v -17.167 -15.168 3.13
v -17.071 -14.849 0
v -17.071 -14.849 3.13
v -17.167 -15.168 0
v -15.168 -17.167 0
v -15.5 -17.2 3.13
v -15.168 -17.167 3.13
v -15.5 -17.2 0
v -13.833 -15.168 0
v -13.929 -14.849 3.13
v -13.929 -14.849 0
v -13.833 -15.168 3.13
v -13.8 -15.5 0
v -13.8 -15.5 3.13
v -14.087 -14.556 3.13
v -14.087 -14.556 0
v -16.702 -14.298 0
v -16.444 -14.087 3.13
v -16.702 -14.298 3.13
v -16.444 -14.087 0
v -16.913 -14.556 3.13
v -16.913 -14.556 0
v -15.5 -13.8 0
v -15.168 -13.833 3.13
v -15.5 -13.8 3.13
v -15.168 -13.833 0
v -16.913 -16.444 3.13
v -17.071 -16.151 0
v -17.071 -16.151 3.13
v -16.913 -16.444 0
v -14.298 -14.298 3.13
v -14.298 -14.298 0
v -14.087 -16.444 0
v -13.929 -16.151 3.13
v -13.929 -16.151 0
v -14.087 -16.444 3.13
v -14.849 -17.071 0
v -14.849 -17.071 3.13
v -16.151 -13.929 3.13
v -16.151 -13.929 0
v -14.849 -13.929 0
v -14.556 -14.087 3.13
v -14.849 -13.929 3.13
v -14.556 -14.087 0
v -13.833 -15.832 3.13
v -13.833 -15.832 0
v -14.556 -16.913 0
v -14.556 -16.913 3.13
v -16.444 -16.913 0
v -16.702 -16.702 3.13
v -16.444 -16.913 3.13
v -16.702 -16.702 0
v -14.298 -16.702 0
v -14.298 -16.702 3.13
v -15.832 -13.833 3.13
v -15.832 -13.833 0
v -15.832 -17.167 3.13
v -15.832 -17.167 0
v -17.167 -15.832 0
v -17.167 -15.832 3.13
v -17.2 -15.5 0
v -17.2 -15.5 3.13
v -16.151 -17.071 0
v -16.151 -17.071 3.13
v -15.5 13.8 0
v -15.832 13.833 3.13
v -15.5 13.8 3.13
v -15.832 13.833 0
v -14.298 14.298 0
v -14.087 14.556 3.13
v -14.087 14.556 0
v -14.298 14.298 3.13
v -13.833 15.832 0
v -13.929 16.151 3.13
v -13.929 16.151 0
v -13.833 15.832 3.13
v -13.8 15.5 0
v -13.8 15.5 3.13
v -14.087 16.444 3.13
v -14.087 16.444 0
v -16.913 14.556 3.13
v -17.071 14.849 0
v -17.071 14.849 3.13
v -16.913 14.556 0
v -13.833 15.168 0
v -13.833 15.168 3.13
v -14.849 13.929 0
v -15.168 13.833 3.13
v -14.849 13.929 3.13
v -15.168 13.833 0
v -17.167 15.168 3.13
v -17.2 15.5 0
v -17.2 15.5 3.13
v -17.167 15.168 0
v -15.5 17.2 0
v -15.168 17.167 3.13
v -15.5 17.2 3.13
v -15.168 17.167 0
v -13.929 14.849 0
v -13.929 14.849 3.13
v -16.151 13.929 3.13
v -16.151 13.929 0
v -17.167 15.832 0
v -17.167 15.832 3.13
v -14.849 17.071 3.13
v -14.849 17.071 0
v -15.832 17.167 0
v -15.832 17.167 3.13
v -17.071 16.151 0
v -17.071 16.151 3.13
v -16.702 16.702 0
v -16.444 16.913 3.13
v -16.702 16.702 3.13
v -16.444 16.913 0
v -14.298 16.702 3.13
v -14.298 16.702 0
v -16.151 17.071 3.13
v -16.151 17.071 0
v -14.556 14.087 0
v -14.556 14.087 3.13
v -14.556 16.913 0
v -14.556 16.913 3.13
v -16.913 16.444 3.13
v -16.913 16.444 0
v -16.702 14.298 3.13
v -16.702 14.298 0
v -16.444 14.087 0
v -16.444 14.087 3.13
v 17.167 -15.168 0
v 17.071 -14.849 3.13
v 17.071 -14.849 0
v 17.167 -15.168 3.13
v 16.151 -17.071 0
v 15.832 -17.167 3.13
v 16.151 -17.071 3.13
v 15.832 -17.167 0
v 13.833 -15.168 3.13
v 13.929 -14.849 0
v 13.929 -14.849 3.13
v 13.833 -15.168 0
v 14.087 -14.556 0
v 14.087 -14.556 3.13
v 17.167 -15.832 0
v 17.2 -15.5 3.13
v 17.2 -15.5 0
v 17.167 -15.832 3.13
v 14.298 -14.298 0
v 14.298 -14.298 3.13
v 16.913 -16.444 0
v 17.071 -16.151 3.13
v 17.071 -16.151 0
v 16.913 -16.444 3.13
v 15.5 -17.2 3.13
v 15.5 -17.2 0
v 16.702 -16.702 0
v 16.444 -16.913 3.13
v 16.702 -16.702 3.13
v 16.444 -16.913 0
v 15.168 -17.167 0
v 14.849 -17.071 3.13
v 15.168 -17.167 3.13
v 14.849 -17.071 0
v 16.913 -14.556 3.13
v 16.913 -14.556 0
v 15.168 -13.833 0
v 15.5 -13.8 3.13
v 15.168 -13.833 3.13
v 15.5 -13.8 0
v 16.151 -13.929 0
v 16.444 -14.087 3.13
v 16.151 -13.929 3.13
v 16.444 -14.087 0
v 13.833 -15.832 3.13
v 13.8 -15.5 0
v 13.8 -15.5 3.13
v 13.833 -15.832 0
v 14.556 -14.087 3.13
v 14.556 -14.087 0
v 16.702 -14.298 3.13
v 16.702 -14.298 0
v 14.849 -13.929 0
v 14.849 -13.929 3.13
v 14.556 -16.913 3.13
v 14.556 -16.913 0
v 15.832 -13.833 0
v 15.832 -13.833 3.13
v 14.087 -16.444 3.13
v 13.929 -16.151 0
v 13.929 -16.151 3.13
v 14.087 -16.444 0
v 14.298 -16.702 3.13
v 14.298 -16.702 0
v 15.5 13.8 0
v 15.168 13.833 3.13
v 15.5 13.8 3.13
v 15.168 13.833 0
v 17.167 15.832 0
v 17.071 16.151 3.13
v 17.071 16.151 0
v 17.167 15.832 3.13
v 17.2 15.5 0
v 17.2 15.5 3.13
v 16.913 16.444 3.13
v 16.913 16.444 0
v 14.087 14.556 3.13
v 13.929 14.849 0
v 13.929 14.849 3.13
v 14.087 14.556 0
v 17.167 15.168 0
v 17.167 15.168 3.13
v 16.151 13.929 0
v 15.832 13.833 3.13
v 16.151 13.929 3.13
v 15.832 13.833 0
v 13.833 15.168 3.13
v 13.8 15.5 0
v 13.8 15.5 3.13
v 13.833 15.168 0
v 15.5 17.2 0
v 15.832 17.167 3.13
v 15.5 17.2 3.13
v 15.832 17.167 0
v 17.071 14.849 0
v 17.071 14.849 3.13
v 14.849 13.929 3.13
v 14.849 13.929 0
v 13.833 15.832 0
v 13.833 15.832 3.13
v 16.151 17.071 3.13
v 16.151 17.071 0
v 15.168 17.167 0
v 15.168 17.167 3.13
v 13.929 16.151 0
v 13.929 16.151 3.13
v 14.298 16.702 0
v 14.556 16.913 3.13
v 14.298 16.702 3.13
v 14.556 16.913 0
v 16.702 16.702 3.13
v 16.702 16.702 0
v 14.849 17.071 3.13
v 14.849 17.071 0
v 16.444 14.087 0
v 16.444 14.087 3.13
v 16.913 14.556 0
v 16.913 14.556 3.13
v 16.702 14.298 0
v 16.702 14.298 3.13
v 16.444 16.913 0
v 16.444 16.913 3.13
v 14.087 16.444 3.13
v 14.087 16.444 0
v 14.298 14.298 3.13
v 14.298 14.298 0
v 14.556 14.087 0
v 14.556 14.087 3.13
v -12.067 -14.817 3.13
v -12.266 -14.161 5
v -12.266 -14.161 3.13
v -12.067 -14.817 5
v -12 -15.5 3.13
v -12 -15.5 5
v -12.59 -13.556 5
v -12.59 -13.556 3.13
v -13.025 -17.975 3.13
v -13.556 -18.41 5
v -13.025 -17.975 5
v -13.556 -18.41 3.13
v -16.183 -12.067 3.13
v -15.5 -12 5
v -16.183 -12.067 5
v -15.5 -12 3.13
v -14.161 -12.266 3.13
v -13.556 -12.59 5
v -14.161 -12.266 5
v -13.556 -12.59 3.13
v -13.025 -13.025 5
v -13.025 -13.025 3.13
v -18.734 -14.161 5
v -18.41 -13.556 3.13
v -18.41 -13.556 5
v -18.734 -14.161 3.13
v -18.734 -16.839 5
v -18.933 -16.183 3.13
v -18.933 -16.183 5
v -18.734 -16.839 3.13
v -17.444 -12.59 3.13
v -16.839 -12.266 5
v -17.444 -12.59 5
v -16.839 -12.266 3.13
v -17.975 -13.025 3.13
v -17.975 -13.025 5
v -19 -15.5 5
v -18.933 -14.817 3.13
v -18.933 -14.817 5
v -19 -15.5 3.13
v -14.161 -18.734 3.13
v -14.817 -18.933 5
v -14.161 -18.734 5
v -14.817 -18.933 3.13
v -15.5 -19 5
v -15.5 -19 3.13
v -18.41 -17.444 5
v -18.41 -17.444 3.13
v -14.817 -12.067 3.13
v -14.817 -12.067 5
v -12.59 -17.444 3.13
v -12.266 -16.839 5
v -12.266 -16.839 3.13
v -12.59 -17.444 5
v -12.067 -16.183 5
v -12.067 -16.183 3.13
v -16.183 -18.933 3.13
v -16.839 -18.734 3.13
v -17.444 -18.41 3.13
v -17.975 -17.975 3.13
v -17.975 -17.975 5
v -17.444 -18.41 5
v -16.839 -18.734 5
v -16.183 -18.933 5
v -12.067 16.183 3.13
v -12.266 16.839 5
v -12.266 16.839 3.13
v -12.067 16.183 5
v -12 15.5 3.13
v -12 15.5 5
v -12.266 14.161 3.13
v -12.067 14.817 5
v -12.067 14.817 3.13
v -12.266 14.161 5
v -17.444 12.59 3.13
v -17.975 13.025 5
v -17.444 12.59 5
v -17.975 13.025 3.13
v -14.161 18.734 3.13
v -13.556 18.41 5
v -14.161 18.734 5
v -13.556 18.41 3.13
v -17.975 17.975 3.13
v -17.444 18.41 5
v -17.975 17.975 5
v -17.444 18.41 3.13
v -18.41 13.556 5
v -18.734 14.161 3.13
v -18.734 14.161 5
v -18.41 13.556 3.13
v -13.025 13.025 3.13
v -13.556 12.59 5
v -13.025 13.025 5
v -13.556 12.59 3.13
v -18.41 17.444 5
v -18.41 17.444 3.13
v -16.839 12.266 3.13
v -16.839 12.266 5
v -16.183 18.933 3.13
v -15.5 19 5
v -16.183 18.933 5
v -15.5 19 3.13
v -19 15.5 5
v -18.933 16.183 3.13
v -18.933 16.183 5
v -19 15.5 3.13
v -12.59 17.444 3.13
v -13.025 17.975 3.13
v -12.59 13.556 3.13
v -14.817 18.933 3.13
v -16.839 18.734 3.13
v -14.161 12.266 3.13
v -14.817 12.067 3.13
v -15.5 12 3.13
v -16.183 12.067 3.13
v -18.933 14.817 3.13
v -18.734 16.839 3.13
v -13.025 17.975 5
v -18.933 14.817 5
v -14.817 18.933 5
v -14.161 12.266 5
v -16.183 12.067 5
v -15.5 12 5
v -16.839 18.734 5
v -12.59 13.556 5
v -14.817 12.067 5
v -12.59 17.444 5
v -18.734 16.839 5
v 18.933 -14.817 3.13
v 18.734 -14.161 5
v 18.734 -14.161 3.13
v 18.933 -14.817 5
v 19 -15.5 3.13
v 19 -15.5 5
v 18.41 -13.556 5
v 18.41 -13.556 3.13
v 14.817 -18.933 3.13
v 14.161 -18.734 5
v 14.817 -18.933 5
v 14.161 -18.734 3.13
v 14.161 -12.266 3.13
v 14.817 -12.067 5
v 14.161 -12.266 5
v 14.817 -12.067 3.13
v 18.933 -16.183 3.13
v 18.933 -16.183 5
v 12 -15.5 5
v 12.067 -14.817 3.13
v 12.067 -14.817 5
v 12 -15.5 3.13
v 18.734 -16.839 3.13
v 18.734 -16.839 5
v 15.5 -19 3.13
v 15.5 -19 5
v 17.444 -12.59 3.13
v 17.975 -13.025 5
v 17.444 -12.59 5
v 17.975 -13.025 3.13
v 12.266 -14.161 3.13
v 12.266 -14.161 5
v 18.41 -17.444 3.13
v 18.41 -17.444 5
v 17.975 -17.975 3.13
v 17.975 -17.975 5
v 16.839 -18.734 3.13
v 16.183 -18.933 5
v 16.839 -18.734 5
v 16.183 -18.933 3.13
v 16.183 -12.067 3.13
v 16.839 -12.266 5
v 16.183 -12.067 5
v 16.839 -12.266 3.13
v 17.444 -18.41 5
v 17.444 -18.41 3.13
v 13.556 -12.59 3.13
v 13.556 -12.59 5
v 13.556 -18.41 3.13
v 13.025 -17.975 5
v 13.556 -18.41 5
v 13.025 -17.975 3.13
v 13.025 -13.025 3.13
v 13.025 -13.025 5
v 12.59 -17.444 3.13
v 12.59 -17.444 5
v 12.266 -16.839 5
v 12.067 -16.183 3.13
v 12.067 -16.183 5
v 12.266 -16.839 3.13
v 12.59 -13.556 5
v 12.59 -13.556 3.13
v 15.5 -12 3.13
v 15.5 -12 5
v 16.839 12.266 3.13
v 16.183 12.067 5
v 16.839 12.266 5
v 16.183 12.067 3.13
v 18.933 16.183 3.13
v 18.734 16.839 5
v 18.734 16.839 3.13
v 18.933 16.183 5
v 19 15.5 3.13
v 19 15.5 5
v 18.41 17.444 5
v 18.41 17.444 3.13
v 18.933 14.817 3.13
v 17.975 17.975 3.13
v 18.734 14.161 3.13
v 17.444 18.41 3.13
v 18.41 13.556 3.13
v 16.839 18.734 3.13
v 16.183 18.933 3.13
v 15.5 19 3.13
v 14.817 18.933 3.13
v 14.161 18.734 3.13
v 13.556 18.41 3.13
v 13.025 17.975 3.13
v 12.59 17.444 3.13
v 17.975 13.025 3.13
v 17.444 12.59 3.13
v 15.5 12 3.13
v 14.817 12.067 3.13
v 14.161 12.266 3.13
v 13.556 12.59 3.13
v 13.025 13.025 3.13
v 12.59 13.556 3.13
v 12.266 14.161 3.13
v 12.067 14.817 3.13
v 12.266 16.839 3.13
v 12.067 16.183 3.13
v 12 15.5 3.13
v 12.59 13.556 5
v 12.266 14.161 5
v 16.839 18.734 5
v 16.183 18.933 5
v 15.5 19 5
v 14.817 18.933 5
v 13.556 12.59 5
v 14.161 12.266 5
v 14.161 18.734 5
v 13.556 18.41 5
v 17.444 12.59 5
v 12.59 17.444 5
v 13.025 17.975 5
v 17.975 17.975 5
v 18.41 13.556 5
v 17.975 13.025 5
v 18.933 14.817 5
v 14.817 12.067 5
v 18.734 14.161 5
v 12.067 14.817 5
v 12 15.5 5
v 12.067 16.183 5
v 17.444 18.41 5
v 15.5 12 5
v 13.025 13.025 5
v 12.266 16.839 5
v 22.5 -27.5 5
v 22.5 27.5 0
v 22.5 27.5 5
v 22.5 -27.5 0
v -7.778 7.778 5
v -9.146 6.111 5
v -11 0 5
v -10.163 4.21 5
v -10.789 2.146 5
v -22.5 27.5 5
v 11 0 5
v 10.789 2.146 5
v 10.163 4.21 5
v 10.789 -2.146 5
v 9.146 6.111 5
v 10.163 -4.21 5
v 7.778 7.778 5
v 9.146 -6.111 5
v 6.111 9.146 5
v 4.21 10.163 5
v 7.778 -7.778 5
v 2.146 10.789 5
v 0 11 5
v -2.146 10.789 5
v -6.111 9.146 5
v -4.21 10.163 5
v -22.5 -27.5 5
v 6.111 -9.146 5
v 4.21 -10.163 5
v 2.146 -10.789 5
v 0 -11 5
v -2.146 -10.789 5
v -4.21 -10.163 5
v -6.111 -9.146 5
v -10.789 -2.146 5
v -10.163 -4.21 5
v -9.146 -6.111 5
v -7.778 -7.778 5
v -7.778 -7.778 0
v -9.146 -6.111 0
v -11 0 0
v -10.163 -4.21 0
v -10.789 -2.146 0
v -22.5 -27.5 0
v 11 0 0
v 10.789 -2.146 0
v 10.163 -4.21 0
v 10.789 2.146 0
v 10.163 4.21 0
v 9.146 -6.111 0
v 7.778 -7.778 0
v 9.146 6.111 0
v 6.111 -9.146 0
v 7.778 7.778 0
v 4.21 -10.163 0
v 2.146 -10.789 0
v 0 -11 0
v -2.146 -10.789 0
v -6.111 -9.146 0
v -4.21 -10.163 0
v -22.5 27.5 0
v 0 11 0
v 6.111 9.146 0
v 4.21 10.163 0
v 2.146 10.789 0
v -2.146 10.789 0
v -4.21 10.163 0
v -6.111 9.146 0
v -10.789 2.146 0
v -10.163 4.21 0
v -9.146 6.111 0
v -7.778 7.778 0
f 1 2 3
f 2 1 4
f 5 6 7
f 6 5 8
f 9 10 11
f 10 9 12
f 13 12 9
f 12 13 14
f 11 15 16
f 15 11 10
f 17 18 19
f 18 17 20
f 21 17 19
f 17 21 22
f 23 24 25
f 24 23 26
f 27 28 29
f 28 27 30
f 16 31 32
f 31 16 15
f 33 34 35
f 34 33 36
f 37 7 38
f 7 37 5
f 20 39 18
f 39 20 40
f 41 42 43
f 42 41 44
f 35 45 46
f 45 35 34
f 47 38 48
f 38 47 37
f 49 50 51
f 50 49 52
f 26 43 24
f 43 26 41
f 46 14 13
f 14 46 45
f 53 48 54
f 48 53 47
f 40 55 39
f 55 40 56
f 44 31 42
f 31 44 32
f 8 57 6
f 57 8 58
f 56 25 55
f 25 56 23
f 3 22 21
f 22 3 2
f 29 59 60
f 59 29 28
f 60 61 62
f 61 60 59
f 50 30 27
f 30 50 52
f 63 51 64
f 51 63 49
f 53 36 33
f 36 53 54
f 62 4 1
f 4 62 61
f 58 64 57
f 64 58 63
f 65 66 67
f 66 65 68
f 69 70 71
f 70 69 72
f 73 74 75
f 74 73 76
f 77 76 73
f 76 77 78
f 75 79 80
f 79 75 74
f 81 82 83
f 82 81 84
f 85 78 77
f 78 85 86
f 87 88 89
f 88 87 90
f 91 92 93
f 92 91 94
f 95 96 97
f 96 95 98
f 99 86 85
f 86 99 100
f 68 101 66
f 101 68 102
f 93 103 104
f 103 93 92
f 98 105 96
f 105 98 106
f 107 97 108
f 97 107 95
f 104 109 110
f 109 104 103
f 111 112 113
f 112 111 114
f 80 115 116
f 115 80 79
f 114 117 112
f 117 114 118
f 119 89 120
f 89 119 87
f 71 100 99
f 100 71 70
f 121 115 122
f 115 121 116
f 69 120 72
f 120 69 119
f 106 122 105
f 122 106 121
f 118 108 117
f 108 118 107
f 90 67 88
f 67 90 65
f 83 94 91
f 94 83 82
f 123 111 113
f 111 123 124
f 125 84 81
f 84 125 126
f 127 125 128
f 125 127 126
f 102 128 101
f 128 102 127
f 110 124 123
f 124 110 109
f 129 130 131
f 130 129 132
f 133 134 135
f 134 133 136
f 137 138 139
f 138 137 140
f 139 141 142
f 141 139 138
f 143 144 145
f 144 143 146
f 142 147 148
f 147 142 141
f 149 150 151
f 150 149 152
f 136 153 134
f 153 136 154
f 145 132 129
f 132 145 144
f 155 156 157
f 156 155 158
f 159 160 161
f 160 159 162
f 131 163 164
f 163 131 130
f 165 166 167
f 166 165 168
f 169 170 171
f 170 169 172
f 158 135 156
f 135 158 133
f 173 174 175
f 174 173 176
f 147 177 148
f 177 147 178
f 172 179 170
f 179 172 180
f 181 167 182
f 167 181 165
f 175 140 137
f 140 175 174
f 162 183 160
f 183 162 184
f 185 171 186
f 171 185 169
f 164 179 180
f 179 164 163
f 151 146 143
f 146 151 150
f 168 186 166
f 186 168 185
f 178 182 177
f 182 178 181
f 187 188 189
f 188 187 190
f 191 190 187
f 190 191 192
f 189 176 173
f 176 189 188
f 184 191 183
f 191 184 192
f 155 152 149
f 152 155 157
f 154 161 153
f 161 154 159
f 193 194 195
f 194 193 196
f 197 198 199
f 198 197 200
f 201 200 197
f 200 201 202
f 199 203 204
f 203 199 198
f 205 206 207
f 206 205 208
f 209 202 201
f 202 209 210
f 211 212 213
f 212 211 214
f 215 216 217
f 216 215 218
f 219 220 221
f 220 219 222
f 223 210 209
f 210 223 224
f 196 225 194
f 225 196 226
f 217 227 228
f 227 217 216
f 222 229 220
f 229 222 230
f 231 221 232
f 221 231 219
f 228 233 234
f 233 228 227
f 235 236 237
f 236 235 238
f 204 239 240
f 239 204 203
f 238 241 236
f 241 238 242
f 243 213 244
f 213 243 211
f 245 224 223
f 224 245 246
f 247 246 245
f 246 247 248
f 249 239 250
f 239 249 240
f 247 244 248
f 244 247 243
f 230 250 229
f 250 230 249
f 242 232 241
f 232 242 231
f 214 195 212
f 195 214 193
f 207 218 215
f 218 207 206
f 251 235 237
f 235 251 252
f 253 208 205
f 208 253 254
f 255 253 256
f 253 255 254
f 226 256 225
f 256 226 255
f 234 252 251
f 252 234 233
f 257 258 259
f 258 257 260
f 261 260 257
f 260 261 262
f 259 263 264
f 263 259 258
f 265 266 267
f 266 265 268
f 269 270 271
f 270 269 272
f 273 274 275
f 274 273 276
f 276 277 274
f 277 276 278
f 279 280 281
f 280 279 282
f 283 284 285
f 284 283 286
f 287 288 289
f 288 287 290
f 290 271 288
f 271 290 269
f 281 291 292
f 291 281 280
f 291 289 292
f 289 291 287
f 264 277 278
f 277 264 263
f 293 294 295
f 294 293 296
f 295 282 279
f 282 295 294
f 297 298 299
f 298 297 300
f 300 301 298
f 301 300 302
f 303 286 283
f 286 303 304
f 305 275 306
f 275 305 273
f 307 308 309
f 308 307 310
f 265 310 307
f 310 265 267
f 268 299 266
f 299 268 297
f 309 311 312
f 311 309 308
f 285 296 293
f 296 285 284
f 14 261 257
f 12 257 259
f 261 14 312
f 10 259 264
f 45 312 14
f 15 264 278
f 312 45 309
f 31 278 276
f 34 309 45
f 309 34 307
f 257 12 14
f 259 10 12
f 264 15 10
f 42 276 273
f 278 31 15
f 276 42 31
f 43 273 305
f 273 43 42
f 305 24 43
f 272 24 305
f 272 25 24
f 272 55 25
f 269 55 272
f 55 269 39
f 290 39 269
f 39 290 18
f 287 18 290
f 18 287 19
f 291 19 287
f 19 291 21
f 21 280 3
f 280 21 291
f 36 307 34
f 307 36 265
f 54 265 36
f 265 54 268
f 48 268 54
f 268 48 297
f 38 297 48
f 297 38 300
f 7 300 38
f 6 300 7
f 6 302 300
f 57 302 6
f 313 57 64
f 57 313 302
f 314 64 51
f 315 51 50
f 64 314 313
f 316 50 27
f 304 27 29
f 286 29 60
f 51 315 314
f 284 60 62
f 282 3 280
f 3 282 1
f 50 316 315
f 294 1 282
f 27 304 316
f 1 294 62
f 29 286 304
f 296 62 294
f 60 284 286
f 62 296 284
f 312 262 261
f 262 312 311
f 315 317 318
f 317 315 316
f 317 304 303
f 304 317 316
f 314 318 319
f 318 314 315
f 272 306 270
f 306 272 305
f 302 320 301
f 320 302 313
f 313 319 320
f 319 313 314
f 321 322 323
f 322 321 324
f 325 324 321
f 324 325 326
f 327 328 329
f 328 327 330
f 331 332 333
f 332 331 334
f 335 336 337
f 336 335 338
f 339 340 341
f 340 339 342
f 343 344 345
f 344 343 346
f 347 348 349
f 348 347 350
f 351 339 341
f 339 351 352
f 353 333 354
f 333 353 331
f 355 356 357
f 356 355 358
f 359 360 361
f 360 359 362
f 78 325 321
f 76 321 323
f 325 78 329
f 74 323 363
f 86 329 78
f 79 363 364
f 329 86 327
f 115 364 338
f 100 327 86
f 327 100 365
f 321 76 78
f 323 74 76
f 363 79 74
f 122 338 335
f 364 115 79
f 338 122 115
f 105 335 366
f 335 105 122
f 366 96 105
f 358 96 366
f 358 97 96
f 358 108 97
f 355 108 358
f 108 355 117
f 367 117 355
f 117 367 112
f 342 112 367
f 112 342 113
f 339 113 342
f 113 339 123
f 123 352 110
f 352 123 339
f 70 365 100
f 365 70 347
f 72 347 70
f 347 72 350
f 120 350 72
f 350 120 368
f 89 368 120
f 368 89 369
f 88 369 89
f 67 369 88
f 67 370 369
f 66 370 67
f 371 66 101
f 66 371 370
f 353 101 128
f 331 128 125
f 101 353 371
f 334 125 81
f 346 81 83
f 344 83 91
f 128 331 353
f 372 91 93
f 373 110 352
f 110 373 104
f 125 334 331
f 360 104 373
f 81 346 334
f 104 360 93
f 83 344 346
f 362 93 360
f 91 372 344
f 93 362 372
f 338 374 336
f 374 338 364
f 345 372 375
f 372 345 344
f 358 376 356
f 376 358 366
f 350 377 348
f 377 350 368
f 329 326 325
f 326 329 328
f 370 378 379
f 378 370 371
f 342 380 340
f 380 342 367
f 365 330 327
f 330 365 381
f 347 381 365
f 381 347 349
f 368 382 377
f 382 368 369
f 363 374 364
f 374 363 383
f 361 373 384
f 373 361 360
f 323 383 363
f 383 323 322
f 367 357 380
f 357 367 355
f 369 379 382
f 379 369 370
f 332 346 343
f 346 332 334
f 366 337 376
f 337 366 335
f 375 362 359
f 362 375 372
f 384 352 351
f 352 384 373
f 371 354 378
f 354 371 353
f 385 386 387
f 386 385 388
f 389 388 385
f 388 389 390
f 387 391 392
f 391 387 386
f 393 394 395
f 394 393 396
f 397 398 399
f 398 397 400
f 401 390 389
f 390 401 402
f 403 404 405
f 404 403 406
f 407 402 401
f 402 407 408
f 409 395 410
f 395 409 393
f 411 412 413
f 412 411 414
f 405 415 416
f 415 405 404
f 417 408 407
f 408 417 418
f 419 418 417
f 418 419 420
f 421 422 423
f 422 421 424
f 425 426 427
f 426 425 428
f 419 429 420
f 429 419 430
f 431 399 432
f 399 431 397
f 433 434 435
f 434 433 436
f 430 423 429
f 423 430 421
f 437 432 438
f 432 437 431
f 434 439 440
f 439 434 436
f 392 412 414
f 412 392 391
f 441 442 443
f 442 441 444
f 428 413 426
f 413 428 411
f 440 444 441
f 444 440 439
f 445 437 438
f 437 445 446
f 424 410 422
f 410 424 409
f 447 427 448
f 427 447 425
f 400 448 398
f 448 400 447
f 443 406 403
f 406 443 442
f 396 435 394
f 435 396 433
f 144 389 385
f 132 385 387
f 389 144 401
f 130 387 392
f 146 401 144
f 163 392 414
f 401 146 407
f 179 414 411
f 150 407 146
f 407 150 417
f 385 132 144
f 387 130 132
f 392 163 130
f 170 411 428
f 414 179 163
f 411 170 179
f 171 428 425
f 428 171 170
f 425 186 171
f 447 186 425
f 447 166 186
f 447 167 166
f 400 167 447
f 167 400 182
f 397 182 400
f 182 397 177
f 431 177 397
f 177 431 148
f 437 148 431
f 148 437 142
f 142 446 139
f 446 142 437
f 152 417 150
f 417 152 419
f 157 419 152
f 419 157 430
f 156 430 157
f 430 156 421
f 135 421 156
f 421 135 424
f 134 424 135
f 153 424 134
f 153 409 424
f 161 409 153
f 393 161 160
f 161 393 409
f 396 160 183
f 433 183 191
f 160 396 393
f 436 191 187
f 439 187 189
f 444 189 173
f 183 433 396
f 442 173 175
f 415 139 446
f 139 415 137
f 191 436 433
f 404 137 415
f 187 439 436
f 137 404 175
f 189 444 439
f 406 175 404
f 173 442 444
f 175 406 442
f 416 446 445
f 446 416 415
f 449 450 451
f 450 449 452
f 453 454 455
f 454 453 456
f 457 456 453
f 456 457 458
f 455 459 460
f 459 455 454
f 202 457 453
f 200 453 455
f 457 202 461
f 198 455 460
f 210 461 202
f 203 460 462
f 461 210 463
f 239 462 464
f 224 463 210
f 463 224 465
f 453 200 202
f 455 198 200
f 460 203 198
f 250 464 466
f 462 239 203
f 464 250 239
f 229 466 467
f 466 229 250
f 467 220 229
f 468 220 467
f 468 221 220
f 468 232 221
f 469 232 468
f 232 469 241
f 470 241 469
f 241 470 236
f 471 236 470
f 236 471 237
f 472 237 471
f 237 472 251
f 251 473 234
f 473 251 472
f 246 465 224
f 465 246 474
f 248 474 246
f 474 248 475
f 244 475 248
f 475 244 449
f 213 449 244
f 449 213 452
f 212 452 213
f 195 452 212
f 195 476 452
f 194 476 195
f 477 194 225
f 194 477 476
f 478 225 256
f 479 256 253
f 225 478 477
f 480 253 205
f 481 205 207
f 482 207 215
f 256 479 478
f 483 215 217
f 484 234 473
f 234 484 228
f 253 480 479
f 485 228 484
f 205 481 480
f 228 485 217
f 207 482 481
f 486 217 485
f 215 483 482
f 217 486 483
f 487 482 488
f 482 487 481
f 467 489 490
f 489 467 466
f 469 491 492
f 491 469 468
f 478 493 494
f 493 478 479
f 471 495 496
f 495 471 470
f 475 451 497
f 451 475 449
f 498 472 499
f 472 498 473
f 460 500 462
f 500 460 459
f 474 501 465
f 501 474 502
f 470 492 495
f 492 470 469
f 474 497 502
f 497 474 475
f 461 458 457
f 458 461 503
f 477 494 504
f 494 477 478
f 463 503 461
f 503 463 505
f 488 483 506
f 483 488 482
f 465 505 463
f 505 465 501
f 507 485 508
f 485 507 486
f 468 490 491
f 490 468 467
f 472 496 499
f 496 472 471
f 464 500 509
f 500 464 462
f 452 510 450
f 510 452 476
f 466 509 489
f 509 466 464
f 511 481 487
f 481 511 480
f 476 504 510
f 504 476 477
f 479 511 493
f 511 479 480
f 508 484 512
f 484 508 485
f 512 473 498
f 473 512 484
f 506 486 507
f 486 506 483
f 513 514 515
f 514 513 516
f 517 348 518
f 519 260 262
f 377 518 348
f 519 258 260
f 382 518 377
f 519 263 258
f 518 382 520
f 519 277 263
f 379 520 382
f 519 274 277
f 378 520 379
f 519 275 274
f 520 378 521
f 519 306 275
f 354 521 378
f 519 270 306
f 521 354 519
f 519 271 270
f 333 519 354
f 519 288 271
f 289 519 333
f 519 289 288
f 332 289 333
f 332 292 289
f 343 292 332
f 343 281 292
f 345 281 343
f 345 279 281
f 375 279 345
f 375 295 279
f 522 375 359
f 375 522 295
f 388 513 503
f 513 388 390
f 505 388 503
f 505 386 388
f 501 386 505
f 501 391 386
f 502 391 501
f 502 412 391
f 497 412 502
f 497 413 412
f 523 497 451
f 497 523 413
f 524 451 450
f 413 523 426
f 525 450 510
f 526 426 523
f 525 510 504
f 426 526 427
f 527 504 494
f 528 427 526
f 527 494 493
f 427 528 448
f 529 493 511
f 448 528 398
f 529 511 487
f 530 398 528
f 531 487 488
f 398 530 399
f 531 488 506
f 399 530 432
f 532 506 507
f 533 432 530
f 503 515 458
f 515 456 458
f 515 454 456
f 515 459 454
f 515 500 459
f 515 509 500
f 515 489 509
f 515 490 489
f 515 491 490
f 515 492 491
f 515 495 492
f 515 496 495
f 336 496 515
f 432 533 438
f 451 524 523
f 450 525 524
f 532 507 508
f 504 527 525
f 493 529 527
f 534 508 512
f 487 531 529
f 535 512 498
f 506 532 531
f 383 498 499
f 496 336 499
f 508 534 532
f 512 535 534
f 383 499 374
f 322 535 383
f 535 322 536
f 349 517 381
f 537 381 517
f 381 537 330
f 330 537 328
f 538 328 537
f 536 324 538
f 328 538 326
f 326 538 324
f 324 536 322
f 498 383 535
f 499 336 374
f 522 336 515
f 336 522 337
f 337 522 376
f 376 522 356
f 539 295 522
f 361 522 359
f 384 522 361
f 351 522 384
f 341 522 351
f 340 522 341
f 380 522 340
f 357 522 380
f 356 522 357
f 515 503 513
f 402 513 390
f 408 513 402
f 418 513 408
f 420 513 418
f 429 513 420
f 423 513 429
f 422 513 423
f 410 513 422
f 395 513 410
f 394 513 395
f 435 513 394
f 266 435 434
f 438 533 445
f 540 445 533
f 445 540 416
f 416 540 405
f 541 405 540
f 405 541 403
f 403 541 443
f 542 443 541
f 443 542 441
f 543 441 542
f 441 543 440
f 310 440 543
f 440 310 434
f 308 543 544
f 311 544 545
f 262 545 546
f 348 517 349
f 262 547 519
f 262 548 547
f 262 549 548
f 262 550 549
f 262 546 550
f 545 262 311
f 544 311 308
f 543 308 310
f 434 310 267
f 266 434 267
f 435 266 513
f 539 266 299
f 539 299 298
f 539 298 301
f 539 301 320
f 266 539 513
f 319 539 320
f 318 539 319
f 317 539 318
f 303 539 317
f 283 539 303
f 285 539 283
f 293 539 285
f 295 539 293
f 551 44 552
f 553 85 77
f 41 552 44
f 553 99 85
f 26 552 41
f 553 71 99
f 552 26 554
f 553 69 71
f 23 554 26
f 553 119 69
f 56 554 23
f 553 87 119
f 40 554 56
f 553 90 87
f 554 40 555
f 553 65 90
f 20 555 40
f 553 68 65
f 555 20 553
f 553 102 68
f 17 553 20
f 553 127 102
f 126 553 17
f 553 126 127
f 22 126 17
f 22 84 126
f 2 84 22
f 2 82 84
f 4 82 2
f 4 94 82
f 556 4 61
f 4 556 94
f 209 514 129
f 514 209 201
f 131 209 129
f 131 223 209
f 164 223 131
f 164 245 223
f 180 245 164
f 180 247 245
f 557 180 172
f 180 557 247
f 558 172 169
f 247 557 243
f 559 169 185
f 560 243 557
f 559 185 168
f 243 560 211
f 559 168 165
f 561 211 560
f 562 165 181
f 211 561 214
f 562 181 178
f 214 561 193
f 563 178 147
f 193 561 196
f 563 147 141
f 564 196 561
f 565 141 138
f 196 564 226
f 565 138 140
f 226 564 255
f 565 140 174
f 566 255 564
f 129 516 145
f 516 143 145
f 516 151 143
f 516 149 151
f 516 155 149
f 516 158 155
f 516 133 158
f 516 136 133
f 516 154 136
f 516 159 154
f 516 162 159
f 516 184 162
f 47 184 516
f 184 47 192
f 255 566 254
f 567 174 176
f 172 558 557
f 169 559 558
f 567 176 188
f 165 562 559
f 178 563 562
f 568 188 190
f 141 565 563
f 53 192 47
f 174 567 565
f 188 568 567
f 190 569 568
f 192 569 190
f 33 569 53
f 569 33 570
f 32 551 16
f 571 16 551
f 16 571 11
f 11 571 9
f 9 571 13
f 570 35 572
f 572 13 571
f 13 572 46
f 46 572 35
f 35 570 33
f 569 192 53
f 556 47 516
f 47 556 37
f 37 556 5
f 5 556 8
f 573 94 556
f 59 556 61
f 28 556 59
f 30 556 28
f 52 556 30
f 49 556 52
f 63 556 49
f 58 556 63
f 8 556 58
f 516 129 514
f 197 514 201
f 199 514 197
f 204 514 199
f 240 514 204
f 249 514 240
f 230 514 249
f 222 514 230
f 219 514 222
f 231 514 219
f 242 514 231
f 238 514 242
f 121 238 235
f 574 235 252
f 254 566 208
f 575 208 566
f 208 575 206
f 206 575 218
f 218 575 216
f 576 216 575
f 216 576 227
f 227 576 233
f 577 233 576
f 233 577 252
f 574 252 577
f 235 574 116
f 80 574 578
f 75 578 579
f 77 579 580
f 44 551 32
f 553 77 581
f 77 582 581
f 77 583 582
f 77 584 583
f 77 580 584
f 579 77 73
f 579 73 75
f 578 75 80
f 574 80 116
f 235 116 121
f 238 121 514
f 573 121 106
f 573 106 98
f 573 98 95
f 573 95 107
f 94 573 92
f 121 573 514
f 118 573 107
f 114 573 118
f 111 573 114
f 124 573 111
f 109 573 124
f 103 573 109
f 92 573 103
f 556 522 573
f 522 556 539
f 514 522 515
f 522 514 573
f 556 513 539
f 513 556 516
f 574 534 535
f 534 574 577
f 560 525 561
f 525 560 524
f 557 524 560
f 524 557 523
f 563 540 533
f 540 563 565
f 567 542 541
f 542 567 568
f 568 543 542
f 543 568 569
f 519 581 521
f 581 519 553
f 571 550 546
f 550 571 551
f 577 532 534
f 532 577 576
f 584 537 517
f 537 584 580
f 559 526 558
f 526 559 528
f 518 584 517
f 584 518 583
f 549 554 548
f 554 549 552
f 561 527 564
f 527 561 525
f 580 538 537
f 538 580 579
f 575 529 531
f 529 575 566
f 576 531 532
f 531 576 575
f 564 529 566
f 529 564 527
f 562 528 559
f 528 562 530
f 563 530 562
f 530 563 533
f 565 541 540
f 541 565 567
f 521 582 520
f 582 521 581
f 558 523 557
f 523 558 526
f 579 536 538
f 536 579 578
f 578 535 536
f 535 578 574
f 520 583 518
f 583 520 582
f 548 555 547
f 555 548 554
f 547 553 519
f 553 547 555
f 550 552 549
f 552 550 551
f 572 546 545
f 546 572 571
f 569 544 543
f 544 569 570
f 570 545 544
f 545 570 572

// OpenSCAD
$fn = 32;

// ----------------------------------------------------------------------
// Motor mount plate: NEMA17, 45 x 55 x 5 mm
// ----------------------------------------------------------------------

// --- parameters (mm) ---
base_x = 45;              // plate length, X
base_y = 55;              // plate width, Y
thick = 5;                // plate thickness
bolt_pitch = 31;          // NEMA17 bolt spacing
motor_d = 3.4;            // NEMA17 screw clearance
boss_hole = 22;           // pilot boss bore
cb_d = 7;                 // counterbore seat
cb_h = 1.87;              // counterbore depth

module plate() {
  translate([-base_x / 2, -base_y / 2, 0]) cube([base_x, base_y, thick]);
}

module motor_holes() {
  for (sx = [-1, 1]) for (sy = [-1, 1])
    translate([sx * bolt_pitch / 2, sy * bolt_pitch / 2, -1])
      cylinder(h = thick + 2, d = motor_d);
}
module motor_counterbores() {
  for (sx = [-1, 1]) for (sy = [-1, 1])
    translate([sx * bolt_pitch / 2, sy * bolt_pitch / 2, thick - cb_h])
      cylinder(h = cb_h + 0.6, d = cb_d);
}

difference() {
  union() {
    plate();
  }
  motor_holes();
  translate([0, 0, -1]) cylinder(h = thick + 2, d = boss_hole);
  motor_counterbores();
}
